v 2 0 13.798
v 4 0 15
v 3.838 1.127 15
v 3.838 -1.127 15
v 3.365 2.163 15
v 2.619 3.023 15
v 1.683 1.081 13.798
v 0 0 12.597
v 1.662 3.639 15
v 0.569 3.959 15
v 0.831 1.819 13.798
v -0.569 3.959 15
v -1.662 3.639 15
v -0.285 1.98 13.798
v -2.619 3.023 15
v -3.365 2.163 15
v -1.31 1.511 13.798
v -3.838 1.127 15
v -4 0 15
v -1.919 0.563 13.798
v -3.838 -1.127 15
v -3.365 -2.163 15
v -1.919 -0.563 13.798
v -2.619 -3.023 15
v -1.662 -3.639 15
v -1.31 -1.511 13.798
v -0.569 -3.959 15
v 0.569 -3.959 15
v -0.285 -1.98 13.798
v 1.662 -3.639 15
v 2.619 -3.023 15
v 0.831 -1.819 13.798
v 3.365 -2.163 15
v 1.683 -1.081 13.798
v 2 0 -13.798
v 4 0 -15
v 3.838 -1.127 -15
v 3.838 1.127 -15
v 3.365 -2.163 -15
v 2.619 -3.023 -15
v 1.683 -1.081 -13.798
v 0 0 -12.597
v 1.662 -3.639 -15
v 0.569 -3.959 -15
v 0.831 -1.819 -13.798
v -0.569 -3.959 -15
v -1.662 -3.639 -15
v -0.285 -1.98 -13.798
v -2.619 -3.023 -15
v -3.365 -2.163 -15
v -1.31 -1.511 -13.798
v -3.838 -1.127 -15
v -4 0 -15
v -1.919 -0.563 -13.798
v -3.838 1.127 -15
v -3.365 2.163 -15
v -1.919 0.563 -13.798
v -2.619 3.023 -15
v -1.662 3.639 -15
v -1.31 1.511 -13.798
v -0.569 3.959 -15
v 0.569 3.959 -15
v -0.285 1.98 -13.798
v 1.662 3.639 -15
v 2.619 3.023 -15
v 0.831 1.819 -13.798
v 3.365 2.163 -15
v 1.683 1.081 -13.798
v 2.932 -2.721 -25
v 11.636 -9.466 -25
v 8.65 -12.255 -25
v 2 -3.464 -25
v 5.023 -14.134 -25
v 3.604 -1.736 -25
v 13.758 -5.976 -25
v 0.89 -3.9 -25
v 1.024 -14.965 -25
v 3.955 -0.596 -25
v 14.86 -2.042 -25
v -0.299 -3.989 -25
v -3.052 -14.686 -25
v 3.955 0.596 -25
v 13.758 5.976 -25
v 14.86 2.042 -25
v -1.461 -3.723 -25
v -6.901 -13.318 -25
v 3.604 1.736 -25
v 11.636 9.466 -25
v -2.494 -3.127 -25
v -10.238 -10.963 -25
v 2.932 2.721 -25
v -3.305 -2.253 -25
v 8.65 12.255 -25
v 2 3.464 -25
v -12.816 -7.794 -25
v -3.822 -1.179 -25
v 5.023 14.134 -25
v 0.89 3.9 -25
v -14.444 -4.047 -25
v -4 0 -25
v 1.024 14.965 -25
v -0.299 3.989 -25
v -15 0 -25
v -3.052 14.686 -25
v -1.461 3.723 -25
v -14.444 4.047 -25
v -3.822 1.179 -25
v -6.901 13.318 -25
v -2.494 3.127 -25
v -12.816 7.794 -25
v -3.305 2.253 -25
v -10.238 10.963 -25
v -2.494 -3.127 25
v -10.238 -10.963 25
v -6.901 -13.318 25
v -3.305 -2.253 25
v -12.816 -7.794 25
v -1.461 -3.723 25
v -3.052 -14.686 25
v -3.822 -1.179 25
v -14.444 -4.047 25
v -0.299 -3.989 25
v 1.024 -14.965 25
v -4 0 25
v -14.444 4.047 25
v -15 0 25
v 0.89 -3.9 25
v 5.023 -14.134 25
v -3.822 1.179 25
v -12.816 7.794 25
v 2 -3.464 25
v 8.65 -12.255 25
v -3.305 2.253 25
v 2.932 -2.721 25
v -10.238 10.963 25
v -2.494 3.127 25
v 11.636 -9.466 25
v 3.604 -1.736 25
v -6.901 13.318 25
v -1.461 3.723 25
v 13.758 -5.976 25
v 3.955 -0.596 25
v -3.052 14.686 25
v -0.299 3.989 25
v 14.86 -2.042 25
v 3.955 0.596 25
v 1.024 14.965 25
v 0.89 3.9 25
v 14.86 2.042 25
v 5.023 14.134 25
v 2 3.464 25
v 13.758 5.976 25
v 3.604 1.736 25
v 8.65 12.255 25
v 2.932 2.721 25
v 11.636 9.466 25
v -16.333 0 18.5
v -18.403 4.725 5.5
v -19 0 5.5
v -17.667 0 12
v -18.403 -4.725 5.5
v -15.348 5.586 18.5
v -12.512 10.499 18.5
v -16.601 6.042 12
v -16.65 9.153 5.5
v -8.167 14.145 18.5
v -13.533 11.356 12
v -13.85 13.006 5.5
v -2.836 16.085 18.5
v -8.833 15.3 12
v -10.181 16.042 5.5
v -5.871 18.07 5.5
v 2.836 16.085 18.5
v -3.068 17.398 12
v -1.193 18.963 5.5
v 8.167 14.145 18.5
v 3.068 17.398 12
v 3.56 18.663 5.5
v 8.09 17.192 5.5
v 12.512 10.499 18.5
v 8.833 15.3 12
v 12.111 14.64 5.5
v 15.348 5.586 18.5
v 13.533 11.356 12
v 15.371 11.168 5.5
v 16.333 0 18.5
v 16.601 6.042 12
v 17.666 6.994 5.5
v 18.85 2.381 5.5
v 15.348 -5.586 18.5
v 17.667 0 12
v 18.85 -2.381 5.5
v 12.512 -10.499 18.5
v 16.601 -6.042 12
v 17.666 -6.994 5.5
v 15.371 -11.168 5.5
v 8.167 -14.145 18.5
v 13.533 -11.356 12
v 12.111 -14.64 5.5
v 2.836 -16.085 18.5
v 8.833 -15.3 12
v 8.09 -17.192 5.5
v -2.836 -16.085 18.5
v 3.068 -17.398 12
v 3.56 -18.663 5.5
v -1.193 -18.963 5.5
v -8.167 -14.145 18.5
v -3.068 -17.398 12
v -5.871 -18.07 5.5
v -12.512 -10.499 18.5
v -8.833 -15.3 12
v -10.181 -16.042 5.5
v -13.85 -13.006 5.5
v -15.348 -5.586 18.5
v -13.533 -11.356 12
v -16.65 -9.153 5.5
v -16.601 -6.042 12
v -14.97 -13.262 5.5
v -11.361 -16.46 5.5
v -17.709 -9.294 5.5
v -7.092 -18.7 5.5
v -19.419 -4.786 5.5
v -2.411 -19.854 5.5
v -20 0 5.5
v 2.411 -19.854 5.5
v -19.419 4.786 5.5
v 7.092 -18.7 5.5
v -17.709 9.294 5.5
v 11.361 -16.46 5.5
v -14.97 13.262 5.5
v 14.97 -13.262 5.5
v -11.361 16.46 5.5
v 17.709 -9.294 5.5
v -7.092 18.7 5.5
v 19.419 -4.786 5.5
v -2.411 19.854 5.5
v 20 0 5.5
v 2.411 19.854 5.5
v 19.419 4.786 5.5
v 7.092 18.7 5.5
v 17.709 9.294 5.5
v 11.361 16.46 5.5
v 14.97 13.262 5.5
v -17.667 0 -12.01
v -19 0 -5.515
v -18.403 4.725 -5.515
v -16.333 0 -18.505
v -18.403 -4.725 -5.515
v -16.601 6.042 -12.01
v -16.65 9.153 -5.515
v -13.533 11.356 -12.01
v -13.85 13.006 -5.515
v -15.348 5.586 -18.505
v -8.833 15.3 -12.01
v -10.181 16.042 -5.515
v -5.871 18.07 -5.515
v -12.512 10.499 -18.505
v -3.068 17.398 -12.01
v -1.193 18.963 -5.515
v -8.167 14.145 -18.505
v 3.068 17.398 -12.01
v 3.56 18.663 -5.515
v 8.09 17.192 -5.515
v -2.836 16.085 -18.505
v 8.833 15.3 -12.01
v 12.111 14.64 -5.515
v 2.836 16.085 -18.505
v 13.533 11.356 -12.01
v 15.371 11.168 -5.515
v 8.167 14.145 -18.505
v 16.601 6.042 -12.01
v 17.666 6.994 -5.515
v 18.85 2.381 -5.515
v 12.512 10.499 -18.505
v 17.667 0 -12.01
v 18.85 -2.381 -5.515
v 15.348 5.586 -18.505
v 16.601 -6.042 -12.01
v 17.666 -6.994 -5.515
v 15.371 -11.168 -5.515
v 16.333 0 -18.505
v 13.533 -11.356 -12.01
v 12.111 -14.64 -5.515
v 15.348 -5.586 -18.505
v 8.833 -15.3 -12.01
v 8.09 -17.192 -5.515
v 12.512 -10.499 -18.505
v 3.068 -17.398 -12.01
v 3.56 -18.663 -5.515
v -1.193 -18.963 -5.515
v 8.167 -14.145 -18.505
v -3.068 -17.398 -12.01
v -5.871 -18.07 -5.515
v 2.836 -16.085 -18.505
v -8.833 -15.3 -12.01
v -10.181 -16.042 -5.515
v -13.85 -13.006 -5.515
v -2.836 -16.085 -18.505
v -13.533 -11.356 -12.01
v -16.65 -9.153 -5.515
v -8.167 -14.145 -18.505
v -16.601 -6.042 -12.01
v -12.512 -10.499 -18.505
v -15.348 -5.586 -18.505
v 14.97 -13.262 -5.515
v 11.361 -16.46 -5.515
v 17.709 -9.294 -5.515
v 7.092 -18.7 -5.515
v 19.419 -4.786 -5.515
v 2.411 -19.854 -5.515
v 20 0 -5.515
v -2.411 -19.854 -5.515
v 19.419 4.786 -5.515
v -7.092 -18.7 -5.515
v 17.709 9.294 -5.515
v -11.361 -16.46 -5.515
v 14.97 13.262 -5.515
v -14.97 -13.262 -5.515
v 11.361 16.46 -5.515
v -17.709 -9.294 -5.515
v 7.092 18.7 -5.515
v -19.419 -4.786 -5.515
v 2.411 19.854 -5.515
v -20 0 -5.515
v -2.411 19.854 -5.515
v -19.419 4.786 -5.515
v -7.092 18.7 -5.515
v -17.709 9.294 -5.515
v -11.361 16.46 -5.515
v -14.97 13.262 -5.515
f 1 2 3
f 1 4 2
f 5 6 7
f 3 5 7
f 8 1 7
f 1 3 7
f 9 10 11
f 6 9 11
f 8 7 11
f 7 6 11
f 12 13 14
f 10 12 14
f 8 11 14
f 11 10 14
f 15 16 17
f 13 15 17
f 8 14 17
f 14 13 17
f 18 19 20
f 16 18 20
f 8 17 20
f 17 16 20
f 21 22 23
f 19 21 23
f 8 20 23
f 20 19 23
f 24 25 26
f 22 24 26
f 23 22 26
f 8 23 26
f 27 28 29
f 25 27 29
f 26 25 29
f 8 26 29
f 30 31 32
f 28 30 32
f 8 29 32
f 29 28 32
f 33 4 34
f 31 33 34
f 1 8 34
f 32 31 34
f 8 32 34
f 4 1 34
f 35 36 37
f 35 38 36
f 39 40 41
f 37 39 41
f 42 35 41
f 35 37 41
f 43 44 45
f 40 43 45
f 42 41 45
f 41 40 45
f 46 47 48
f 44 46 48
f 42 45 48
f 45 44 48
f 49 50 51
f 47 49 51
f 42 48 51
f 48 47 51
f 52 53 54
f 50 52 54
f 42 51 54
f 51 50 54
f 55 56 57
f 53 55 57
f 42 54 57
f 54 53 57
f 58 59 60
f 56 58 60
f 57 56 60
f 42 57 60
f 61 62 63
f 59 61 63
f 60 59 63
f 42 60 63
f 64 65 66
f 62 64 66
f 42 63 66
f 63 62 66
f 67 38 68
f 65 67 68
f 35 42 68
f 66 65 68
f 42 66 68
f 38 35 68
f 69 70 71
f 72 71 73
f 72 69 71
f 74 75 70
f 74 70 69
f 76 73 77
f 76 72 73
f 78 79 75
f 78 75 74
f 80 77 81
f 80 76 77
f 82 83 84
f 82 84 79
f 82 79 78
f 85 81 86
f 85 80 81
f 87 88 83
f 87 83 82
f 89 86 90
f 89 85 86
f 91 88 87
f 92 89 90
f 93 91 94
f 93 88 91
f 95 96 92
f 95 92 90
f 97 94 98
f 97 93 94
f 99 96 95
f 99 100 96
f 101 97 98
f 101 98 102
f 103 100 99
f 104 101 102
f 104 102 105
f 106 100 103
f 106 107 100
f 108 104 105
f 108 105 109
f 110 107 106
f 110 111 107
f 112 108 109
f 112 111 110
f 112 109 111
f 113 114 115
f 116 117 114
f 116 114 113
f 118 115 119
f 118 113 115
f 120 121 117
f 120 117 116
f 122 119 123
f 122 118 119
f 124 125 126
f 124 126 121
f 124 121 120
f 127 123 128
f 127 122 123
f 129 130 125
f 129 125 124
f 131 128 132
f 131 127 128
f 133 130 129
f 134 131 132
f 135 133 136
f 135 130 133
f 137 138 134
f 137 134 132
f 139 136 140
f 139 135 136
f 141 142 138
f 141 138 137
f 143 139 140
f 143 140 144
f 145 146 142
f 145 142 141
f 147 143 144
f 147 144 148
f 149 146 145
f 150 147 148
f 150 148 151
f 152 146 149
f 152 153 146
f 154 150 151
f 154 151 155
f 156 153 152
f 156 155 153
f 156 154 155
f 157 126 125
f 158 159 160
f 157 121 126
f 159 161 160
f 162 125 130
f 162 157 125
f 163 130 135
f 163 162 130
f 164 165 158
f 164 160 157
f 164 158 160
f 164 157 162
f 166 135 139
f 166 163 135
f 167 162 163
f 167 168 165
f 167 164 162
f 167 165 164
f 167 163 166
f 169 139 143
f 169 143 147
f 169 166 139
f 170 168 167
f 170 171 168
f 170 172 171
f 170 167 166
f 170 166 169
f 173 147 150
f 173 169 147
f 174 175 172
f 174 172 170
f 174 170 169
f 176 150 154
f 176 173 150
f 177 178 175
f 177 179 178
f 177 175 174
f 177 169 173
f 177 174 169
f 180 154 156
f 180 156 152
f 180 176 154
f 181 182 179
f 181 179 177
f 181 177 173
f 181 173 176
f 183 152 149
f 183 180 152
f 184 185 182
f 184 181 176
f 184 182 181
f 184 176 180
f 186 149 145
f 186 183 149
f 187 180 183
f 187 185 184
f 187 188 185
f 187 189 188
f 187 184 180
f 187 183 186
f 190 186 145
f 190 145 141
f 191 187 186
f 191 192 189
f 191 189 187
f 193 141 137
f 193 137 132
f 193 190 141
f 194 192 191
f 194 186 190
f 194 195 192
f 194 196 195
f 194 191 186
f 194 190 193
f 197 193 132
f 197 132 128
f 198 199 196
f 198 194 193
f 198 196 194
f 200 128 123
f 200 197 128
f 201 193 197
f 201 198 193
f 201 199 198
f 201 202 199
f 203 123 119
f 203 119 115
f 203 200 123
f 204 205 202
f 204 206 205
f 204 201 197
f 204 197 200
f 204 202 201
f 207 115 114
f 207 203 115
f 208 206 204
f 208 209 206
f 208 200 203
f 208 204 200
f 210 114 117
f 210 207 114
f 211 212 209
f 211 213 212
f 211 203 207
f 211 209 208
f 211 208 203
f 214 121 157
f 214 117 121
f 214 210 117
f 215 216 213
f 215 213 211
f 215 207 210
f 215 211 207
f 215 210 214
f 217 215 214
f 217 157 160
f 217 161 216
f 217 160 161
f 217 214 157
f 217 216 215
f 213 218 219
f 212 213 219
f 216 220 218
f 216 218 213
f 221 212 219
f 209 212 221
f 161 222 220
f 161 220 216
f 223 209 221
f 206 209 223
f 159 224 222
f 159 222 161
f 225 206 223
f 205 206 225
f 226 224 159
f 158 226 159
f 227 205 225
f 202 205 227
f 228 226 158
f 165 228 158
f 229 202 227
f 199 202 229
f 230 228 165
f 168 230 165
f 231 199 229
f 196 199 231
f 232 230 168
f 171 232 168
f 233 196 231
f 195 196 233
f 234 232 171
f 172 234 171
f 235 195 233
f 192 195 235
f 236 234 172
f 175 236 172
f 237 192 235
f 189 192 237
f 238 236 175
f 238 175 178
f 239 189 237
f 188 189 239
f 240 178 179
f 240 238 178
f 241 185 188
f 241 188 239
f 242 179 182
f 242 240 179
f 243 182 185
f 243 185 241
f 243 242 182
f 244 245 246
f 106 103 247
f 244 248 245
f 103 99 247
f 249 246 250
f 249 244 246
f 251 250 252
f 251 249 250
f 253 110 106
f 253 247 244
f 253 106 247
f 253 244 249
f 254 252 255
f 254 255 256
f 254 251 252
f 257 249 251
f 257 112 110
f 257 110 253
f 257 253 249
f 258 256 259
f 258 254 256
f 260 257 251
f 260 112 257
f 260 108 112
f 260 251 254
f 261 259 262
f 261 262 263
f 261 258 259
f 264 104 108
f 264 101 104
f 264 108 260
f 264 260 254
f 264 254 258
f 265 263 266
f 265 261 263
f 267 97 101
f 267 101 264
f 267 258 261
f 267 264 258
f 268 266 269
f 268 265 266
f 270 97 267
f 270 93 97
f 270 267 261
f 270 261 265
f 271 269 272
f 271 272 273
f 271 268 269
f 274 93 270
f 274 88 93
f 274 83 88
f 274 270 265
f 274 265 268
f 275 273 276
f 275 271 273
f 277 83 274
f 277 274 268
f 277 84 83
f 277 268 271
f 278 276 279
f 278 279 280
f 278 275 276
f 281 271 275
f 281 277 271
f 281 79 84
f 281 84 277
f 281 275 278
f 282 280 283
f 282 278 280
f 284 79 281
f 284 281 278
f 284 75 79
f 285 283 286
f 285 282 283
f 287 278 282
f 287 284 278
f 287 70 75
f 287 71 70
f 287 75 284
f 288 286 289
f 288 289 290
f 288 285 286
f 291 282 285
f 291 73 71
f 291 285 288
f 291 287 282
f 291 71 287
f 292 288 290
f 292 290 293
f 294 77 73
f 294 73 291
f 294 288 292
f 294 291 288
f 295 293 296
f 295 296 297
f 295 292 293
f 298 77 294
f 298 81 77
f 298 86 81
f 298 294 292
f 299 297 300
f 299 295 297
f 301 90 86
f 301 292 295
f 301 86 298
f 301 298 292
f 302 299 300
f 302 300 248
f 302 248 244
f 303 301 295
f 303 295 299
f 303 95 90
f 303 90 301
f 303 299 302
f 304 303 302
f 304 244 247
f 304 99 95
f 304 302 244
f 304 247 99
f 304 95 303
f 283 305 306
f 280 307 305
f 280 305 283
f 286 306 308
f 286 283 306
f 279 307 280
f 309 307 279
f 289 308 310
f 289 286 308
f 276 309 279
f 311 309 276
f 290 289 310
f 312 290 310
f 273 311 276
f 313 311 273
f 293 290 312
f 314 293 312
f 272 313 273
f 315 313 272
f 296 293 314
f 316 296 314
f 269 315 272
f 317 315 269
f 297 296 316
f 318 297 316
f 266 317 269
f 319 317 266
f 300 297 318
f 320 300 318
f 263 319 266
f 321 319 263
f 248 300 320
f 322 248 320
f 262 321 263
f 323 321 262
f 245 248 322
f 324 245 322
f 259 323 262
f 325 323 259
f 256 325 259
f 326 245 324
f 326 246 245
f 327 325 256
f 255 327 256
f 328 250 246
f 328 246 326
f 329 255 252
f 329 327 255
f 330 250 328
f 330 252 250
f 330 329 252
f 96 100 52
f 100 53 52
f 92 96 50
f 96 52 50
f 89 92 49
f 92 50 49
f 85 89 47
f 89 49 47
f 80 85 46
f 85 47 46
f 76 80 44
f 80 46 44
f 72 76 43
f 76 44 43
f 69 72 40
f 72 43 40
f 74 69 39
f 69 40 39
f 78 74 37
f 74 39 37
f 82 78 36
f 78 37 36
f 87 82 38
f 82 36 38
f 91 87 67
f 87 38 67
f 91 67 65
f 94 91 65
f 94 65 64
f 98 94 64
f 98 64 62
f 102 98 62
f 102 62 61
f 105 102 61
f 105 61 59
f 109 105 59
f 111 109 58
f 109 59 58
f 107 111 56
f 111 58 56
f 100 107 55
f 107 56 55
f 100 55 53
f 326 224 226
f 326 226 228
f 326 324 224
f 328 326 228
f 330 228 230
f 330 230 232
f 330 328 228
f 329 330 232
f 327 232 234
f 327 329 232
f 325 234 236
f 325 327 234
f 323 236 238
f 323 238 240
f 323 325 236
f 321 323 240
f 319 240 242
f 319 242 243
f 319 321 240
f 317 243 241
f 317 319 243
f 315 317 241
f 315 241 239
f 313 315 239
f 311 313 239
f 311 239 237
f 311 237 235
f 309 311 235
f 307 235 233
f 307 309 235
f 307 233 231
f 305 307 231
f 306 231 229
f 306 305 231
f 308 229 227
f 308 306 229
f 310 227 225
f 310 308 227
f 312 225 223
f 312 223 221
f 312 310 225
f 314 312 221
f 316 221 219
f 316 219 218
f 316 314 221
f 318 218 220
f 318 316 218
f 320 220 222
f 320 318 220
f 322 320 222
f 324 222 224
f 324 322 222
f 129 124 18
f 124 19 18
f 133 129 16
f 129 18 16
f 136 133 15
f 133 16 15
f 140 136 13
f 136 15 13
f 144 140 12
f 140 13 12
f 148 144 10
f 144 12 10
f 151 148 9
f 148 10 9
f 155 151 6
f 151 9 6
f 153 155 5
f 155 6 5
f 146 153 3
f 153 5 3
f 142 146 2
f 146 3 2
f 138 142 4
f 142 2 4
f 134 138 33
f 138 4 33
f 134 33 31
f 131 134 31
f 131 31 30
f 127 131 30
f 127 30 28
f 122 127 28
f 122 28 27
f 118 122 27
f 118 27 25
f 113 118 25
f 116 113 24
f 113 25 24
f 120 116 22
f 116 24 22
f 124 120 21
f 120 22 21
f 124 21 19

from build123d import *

# Parameters (mm, degrees)
F4_D           = 8
F4_DEPTH       = 10
F4_TIP         = 2.4034424761
F4_ON_F2_D     = 8
F4_ON_F2_DEPTH = 10
F4_ON_F2_TIP   = 2.4034424761


with BuildPart() as f1:
    # F0 (on Front) → F1 (revolve)
    with BuildSketch(Plane.XZ):
        Polygon((0, -25), (0, 25), (-15, 25), (-19, 5.5), (-20, 5.5), (-20, 0), (-20, -5.5), (-20, -5.5145598017), (-19, -5.5145598017), (-15, -25), align=None)
    revolve(axis=Axis((0, 0, 0), (0, 0, -1)))

    # F4
    with Locations(Plane(origin=(0, 0, -25), x_dir=(1, 0, 0), z_dir=(0, 0, -1))):
        with Locations((0, 0)):
            Hole(F4_D / 2, depth=F4_DEPTH)
            with Locations((0, 0, -(F4_DEPTH + F4_TIP / 2))):  # 118° drill point
                Cone(0, F4_D / 2, F4_TIP, mode=Mode.SUBTRACT)

    # F4 on F2
    with Locations(Plane.XY.offset(25)):
        with Locations((0, 0)):
            Hole(F4_ON_F2_D / 2, depth=F4_ON_F2_DEPTH)
            with Locations((0, 0, -(F4_ON_F2_DEPTH + F4_ON_F2_TIP / 2))):  # 118° drill point
                Cone(0, F4_ON_F2_D / 2, F4_ON_F2_TIP, mode=Mode.SUBTRACT)


solid = f1.part
